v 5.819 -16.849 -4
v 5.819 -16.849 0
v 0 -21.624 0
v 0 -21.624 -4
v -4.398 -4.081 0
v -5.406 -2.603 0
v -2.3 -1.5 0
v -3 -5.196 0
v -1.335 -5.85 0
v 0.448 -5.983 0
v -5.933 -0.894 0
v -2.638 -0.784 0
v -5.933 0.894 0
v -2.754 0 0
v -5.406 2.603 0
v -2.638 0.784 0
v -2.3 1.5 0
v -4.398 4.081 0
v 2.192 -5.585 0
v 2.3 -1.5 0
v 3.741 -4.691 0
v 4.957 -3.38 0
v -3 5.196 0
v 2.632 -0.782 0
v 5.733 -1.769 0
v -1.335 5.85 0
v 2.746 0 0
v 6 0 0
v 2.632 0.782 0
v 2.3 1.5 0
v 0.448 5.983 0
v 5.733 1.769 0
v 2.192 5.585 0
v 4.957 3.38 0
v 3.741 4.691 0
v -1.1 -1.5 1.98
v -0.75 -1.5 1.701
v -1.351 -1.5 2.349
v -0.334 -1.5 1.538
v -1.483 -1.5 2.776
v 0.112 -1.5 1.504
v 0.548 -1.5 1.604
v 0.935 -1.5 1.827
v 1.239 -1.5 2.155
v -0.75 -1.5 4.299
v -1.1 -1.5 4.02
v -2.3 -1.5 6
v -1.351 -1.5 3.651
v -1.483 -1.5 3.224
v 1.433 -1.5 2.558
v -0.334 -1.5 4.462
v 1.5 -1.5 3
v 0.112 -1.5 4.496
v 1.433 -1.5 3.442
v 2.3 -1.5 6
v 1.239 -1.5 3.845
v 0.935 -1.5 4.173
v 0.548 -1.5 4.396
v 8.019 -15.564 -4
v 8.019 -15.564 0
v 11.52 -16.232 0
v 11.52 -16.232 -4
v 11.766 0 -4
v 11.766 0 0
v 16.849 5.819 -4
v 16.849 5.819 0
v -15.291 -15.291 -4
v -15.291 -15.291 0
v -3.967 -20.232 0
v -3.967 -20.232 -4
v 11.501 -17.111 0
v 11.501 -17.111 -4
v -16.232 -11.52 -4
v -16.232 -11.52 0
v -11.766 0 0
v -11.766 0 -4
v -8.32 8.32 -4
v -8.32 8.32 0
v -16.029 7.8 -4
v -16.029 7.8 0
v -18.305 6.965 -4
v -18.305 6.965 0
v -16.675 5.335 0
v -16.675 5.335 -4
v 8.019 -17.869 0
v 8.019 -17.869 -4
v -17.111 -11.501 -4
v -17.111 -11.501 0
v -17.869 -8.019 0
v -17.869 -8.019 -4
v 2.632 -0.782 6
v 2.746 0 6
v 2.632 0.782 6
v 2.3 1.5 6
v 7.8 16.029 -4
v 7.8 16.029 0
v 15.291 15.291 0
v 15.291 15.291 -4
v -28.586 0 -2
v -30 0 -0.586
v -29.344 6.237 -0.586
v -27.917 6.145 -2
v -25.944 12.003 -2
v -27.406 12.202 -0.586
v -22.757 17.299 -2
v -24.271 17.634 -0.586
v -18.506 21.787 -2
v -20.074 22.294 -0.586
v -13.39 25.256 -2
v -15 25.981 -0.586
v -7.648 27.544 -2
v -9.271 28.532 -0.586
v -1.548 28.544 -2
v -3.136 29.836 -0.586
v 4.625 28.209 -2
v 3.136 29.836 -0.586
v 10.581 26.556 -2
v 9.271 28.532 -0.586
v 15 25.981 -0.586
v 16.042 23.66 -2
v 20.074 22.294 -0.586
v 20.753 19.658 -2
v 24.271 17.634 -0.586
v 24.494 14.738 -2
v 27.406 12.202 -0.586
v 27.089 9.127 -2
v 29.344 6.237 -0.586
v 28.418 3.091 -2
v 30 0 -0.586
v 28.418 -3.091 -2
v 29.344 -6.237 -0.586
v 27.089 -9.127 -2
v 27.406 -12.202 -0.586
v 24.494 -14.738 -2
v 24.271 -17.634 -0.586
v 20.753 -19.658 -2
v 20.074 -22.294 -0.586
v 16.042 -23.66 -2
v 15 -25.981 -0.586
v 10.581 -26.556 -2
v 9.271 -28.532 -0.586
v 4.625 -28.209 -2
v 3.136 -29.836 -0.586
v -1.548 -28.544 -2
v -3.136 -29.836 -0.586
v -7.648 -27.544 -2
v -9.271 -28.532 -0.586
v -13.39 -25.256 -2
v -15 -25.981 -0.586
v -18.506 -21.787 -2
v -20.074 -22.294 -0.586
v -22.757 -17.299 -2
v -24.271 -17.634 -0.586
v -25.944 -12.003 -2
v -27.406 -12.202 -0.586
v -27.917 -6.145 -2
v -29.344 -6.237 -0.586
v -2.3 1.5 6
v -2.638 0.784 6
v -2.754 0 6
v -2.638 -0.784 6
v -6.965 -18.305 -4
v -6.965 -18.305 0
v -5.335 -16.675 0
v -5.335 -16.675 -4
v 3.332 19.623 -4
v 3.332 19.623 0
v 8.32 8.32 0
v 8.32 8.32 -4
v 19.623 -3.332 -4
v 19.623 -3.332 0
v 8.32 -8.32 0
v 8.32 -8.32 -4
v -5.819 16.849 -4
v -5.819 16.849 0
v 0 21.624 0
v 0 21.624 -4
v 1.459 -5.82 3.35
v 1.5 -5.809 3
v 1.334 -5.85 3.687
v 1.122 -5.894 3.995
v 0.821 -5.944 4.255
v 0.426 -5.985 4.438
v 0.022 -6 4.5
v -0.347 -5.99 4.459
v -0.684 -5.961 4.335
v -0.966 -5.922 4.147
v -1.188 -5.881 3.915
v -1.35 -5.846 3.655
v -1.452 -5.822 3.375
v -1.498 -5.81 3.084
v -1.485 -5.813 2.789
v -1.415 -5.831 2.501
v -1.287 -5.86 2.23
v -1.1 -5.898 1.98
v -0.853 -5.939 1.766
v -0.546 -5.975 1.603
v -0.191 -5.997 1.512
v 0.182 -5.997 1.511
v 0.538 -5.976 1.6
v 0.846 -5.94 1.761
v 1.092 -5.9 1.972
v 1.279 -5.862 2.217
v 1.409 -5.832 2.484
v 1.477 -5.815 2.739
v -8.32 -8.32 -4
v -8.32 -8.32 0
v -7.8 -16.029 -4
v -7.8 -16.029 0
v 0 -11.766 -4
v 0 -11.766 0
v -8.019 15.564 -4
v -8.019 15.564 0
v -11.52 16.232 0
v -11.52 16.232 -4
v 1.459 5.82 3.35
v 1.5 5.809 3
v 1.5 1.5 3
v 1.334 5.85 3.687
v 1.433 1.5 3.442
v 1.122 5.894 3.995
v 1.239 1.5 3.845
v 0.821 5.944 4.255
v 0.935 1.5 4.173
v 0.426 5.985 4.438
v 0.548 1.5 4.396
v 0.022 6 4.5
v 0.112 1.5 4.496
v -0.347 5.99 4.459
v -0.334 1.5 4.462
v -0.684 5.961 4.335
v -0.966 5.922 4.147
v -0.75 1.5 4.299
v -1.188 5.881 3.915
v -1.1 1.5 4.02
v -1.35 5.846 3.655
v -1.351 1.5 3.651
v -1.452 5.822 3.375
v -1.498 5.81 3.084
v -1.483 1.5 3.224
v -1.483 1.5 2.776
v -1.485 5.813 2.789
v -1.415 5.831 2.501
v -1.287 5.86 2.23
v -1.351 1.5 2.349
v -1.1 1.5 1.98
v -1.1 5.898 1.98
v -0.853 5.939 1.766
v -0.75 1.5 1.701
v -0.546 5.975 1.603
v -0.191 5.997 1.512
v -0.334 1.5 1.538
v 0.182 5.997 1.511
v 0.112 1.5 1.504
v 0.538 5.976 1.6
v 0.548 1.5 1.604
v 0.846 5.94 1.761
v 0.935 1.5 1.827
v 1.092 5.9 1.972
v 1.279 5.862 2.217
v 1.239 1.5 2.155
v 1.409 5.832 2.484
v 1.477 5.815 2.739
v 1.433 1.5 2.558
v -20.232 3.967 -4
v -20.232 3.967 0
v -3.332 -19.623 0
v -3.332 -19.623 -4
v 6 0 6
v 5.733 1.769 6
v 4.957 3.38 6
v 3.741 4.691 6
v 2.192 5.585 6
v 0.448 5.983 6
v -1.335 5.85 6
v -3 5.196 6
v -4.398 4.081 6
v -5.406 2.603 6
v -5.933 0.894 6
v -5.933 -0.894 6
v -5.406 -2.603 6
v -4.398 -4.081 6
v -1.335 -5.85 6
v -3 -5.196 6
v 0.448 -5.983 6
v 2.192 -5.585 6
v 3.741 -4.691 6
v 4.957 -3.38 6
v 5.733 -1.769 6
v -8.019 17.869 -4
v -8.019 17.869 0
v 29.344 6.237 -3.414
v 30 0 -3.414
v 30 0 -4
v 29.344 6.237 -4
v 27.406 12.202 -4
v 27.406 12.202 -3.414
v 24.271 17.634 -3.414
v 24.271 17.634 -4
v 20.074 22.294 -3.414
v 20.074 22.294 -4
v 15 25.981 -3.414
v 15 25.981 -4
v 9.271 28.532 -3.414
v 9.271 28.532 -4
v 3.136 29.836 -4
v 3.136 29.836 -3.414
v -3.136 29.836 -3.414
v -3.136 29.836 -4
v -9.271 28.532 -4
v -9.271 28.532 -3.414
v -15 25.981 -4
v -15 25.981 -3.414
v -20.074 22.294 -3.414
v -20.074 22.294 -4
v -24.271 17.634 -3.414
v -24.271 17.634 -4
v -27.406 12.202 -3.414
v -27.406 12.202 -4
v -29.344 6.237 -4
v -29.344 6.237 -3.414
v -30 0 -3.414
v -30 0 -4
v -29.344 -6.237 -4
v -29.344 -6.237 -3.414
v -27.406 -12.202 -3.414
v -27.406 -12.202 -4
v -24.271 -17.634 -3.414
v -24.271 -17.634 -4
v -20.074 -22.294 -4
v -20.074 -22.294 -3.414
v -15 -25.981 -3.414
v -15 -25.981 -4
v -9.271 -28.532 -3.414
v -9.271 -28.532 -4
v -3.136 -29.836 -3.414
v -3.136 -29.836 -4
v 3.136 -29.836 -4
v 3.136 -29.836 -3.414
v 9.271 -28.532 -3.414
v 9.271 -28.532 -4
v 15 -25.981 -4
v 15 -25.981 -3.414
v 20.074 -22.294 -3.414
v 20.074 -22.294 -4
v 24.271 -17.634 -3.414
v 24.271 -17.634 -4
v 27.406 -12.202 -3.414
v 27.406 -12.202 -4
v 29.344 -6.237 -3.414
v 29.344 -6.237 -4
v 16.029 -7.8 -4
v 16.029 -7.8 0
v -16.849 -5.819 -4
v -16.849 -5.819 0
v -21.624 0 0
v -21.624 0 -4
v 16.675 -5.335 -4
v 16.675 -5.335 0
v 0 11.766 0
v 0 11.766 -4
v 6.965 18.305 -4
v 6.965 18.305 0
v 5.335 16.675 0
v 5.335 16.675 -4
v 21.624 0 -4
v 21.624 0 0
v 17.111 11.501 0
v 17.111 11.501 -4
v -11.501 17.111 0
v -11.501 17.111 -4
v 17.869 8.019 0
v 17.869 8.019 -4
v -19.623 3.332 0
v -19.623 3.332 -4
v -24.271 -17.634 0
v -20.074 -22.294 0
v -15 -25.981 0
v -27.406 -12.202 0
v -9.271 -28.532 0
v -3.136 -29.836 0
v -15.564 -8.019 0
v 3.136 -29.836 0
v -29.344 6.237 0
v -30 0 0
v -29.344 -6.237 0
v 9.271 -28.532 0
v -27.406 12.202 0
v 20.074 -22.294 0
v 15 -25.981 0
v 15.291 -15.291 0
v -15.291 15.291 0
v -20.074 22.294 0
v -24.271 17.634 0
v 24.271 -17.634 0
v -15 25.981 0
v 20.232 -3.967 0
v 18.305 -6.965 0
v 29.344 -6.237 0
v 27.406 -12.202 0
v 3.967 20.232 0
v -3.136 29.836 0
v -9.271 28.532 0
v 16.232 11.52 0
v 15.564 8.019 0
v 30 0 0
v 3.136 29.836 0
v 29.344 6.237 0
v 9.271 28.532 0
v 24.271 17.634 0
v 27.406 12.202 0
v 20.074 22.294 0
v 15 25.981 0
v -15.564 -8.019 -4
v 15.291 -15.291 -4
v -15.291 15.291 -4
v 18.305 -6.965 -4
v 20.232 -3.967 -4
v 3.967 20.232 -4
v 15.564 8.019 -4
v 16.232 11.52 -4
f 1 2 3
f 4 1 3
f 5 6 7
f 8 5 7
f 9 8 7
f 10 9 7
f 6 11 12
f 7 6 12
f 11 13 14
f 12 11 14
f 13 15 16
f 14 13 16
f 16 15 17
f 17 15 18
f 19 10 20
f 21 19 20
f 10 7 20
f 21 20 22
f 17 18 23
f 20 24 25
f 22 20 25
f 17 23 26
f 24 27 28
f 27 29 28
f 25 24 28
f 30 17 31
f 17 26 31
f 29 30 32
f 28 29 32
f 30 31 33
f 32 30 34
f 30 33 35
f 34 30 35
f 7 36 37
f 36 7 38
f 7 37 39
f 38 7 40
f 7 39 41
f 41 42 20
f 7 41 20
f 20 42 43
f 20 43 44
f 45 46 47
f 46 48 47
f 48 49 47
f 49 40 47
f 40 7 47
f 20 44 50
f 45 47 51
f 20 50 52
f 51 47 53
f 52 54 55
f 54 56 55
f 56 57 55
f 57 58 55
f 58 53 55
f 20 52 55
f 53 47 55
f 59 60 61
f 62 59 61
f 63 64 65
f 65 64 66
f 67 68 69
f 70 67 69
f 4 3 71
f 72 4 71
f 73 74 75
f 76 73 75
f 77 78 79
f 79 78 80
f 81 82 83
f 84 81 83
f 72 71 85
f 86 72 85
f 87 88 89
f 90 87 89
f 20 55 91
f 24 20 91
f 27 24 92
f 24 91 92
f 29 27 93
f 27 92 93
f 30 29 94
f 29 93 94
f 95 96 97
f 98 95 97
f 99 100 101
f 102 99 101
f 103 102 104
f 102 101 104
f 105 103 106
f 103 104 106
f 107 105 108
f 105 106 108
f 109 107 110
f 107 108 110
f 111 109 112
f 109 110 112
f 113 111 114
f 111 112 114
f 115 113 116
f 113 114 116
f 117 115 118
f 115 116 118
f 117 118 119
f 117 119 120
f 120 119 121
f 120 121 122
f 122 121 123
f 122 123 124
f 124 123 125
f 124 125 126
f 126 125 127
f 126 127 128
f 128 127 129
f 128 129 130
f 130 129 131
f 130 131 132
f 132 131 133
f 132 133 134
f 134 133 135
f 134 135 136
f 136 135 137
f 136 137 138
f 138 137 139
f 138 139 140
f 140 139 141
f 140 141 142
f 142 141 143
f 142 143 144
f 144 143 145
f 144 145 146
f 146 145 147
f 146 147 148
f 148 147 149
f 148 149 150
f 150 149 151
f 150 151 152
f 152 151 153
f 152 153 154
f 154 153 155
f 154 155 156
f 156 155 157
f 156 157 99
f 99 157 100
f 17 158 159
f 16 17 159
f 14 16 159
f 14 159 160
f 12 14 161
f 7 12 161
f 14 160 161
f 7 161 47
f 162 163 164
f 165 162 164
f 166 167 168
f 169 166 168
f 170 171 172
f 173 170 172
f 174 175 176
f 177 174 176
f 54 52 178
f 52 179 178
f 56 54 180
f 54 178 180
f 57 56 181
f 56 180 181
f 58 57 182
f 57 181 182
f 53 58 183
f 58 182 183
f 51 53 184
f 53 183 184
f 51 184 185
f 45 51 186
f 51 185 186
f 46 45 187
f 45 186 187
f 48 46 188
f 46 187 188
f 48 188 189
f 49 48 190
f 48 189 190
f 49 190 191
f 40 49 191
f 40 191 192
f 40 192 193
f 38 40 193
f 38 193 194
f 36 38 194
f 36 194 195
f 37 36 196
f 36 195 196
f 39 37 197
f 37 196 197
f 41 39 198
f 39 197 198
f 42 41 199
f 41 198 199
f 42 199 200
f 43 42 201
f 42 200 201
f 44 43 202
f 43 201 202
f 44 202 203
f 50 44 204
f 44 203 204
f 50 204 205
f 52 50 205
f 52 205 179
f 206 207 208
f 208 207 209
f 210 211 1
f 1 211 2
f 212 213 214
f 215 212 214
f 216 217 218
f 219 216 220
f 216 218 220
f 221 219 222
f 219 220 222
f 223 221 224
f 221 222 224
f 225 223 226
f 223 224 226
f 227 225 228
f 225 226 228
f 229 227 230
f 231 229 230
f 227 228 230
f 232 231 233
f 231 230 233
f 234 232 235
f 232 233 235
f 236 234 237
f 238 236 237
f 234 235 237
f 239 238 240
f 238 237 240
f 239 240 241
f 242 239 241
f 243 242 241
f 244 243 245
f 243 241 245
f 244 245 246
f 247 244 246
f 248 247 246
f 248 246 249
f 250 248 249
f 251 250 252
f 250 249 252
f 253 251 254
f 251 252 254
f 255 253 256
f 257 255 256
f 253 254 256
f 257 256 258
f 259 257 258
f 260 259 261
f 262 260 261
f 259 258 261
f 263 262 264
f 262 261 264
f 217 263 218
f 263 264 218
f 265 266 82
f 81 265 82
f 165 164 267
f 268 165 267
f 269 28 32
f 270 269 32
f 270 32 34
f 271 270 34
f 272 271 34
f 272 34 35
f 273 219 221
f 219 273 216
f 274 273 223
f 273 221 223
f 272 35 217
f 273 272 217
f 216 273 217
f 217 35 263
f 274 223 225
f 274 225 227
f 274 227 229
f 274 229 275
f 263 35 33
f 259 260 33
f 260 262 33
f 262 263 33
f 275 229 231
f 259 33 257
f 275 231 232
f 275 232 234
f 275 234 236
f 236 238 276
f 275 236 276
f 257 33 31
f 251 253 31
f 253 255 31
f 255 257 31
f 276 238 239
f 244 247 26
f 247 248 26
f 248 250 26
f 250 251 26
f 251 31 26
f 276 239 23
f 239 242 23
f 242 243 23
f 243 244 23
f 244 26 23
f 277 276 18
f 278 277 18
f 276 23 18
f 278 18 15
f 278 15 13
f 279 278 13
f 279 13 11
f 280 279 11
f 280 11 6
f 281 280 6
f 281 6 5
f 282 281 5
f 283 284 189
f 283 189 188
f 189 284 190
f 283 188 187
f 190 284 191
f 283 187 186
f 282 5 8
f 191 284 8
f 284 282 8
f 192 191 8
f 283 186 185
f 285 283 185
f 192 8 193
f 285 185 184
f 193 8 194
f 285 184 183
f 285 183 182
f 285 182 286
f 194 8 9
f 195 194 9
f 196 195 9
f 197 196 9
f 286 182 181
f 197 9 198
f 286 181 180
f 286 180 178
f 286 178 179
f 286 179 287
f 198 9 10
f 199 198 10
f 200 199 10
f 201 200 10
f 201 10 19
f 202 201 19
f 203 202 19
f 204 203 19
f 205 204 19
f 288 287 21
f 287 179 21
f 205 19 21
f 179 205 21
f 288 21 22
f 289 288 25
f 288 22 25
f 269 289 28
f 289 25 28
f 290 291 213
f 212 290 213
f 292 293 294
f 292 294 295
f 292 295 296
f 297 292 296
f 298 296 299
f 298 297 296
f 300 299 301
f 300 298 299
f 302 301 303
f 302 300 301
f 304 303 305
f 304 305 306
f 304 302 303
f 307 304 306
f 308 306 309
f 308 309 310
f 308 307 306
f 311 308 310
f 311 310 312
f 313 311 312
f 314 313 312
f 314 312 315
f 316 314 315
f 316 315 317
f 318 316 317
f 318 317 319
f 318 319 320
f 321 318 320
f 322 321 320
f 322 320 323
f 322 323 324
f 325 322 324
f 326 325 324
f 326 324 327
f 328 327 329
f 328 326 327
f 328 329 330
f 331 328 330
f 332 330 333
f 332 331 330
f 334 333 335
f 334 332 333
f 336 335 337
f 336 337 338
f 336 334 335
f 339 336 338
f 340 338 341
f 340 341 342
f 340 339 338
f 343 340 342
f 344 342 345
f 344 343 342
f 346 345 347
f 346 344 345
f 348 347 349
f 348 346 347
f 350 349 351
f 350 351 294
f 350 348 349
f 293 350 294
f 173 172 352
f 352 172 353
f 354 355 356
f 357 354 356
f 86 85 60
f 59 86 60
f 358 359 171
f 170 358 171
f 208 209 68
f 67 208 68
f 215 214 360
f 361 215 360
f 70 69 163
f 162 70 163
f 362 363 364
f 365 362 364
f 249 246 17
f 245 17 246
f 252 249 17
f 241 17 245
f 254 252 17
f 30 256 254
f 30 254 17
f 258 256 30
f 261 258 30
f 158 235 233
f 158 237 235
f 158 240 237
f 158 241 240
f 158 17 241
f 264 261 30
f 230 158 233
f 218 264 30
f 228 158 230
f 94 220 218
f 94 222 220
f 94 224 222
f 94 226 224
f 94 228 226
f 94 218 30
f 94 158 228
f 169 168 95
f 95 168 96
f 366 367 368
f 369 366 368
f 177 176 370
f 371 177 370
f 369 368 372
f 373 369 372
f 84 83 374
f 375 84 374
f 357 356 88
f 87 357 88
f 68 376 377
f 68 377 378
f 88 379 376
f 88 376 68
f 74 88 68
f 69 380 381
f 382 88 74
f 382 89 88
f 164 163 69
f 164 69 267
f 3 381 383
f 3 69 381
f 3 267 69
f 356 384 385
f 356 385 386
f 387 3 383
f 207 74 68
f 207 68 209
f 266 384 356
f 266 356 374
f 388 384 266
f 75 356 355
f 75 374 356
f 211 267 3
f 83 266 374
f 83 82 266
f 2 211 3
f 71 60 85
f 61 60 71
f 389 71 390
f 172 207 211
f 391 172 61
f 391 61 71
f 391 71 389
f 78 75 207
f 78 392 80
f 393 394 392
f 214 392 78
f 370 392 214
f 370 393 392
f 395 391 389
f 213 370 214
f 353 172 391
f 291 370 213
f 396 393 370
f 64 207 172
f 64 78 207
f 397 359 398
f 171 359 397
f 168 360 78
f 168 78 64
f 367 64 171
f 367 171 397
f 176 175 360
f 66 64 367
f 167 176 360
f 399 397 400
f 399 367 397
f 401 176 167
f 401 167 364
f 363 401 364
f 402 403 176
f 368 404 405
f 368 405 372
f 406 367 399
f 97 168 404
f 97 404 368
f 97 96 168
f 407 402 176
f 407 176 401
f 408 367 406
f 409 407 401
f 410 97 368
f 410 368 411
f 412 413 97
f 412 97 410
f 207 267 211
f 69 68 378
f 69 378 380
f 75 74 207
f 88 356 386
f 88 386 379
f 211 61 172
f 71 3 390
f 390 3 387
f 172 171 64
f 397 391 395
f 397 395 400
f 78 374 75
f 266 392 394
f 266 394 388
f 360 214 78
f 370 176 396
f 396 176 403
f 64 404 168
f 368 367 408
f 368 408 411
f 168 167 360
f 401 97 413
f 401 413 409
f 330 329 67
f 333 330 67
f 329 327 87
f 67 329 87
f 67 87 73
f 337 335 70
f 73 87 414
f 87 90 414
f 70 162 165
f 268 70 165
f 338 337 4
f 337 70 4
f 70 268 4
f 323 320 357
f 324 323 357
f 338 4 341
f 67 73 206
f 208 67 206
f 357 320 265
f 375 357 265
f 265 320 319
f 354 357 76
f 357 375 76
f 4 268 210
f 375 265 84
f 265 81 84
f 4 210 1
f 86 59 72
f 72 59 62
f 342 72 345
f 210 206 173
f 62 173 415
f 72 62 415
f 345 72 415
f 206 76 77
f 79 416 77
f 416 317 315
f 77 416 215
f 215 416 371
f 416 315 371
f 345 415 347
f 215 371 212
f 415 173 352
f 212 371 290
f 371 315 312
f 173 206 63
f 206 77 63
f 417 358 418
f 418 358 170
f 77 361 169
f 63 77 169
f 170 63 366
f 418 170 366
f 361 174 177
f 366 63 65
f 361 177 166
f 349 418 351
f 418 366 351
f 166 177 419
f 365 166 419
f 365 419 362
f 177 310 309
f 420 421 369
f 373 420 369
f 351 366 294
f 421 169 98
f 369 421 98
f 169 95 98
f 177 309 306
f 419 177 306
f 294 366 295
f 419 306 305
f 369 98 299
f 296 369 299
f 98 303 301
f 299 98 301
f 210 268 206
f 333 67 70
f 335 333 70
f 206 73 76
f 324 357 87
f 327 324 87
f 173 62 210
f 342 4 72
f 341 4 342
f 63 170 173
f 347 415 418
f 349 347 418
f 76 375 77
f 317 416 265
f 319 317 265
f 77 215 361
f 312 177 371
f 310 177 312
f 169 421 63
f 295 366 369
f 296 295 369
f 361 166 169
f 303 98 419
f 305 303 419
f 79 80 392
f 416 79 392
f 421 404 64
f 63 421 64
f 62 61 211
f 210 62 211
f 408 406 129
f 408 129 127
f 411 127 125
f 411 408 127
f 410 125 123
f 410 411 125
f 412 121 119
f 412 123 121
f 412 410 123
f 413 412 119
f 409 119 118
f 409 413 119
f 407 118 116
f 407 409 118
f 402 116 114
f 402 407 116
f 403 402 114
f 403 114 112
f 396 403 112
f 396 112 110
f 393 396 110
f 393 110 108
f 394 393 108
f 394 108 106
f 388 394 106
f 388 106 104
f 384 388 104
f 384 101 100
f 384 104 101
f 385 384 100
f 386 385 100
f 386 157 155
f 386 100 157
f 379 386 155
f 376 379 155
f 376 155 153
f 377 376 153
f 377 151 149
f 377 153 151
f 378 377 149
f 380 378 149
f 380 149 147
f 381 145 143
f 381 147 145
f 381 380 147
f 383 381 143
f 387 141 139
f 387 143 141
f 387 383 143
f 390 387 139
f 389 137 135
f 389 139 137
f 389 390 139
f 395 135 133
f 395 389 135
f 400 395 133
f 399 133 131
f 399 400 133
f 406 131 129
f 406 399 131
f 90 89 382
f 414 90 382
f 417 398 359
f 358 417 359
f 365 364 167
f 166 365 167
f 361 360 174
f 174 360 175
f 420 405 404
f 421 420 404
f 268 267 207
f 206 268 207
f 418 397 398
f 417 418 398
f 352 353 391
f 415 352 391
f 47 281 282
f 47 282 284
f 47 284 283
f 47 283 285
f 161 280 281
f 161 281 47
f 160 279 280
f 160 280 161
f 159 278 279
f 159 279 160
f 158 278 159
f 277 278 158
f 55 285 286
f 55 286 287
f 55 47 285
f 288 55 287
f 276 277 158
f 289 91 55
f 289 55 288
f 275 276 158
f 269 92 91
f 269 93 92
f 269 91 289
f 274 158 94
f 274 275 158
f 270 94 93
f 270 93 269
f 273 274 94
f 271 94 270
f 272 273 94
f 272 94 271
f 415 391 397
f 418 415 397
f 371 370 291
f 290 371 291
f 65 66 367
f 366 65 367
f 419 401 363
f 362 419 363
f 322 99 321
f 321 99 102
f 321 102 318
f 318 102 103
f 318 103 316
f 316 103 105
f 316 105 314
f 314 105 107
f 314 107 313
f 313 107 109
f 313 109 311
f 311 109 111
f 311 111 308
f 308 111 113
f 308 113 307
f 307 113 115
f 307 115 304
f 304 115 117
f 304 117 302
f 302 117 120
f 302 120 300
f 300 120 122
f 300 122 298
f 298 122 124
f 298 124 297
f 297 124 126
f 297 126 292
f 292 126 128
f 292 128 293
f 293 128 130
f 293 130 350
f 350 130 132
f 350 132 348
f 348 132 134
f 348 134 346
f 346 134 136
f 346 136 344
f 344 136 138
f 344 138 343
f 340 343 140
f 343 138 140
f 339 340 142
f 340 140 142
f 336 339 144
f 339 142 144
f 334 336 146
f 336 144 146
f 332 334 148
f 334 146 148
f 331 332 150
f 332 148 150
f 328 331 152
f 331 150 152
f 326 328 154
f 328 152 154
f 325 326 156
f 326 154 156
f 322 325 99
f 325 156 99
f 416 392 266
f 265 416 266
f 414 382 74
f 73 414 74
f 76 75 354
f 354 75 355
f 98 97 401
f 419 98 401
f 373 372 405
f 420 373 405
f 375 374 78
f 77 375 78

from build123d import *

# Parameters (mm, degrees)
F0_R             = 30
F0_R_2           = 6
F1_DEPTH         = 4
F2_DEPTH         = 6
F3_R             = 1.5
F4_DEPTH         = 7.5
F5_W             = 4.6
F5_H             = 3
F6_DEPTH         = 9.4
F10_DEPTH        = 4
F10_COPIES_COUNT = 8


# Not quite as in the source:
# - a pattern or mirror of a feature is missing from the dataset's text; its kind, count and spacing are read off the source's solid


with BuildPart() as f1:
    # F0 (on Top) → F1 (new body)
    with BuildSketch(Plane.XY):
        Circle(F0_R)
        Circle(F0_R_2, mode=Mode.SUBTRACT)
        Circle(F0_R_2)
    extrude(amount=-F1_DEPTH)

    # F7 (on Front) → F8 (revolve, cut)
    with BuildSketch(Plane.XZ):
        Polygon((-28.5857864376, -2), (-30, -0.5857864376), (-30, -3.4142135624), align=None)
    revolve(axis=Axis((0, 0, 5.5037373677), (0, 0, -1)), mode=Mode.SUBTRACT)

    # F9 (on face) → F10 (cut, through all)
    with BuildSketch(Plane.XY):
        Polygon((-5.8188787661, 16.8492398092), (0, 21.6240715235), (-11.5014315608, 17.1112040934), (-8.0188345164, 17.8686082363), (-8.0188345164, 15.5638335273), (-11.5196653077, 16.2319106039), (0, 11.7657924248), align=None)
    f10 = extrude(amount=-F10_DEPTH, mode=Mode.SUBTRACT)

    # F10_copies: F10 ×8 about axis
    f10_copies_axis = Axis((0, 0, 0), (0, 0, 1))
    for i in range(1, F10_COPIES_COUNT):
        add(f10.rotate(f10_copies_axis, i * 360 / F10_COPIES_COUNT), mode=Mode.SUBTRACT)


with BuildPart() as f2:
    # F0 (on Top) → F2 (new body)
    with BuildSketch(Plane.XY):
        Circle(F0_R_2)
    extrude(amount=F2_DEPTH)

    # F3 (on Front) → F4 (cut, symmetric)
    with BuildSketch(Plane.XZ):
        with Locations((0, 3)):
            Circle(F3_R)
    extrude(amount=F4_DEPTH, both=True, mode=Mode.SUBTRACT)

    # F5 (on face) → F6 (cut)
    with BuildSketch(Plane.XY.offset(6)):
        Rectangle(F5_W, F5_H)
        with BuildLine():
            Line((2.3, 1.5), (2.3, -1.5))
            ThreePointArc((2.3, -1.5), (2.7459060435, 0), (2.3, 1.5))
        make_face()
        with BuildLine():
            ThreePointArc((-2.3, 1.5), (-2.7540939565, 0), (-2.3, -1.5))
            Line((-2.3, -1.5), (-2.3, 1.5))
        make_face()
    extrude(amount=-F6_DEPTH, mode=Mode.SUBTRACT)


solid = Compound([f1.part, f2.part])
